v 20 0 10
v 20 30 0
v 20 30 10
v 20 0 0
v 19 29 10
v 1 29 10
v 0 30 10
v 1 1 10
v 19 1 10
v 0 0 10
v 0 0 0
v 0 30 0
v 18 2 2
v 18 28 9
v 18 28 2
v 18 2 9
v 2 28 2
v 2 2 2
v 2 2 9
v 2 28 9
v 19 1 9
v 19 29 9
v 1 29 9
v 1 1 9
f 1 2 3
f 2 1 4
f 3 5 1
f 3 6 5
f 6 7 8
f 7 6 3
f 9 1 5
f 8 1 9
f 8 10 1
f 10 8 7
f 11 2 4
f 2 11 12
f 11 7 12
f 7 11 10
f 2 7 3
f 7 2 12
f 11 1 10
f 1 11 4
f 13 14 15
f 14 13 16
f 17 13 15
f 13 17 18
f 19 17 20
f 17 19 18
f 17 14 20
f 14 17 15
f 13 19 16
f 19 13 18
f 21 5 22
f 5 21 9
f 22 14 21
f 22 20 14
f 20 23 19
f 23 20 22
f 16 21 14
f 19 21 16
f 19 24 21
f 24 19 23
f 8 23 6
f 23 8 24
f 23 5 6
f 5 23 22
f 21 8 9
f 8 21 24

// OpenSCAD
// Esimerkki 1a: Yksinkertainen laatikko (z-välkyntää esintyy)

box = [20, 30, 10];
wall = 2;

difference() {
  cube(box);
  translate([wall, wall, wall]) cube(box - [2*wall, 2*wall, wall]);
  translate([0.5*wall, 0.5*wall, box[2]-0.5*wall]) cube([box[0]-wall, box[1]-wall, 0.5*wall]);
}
